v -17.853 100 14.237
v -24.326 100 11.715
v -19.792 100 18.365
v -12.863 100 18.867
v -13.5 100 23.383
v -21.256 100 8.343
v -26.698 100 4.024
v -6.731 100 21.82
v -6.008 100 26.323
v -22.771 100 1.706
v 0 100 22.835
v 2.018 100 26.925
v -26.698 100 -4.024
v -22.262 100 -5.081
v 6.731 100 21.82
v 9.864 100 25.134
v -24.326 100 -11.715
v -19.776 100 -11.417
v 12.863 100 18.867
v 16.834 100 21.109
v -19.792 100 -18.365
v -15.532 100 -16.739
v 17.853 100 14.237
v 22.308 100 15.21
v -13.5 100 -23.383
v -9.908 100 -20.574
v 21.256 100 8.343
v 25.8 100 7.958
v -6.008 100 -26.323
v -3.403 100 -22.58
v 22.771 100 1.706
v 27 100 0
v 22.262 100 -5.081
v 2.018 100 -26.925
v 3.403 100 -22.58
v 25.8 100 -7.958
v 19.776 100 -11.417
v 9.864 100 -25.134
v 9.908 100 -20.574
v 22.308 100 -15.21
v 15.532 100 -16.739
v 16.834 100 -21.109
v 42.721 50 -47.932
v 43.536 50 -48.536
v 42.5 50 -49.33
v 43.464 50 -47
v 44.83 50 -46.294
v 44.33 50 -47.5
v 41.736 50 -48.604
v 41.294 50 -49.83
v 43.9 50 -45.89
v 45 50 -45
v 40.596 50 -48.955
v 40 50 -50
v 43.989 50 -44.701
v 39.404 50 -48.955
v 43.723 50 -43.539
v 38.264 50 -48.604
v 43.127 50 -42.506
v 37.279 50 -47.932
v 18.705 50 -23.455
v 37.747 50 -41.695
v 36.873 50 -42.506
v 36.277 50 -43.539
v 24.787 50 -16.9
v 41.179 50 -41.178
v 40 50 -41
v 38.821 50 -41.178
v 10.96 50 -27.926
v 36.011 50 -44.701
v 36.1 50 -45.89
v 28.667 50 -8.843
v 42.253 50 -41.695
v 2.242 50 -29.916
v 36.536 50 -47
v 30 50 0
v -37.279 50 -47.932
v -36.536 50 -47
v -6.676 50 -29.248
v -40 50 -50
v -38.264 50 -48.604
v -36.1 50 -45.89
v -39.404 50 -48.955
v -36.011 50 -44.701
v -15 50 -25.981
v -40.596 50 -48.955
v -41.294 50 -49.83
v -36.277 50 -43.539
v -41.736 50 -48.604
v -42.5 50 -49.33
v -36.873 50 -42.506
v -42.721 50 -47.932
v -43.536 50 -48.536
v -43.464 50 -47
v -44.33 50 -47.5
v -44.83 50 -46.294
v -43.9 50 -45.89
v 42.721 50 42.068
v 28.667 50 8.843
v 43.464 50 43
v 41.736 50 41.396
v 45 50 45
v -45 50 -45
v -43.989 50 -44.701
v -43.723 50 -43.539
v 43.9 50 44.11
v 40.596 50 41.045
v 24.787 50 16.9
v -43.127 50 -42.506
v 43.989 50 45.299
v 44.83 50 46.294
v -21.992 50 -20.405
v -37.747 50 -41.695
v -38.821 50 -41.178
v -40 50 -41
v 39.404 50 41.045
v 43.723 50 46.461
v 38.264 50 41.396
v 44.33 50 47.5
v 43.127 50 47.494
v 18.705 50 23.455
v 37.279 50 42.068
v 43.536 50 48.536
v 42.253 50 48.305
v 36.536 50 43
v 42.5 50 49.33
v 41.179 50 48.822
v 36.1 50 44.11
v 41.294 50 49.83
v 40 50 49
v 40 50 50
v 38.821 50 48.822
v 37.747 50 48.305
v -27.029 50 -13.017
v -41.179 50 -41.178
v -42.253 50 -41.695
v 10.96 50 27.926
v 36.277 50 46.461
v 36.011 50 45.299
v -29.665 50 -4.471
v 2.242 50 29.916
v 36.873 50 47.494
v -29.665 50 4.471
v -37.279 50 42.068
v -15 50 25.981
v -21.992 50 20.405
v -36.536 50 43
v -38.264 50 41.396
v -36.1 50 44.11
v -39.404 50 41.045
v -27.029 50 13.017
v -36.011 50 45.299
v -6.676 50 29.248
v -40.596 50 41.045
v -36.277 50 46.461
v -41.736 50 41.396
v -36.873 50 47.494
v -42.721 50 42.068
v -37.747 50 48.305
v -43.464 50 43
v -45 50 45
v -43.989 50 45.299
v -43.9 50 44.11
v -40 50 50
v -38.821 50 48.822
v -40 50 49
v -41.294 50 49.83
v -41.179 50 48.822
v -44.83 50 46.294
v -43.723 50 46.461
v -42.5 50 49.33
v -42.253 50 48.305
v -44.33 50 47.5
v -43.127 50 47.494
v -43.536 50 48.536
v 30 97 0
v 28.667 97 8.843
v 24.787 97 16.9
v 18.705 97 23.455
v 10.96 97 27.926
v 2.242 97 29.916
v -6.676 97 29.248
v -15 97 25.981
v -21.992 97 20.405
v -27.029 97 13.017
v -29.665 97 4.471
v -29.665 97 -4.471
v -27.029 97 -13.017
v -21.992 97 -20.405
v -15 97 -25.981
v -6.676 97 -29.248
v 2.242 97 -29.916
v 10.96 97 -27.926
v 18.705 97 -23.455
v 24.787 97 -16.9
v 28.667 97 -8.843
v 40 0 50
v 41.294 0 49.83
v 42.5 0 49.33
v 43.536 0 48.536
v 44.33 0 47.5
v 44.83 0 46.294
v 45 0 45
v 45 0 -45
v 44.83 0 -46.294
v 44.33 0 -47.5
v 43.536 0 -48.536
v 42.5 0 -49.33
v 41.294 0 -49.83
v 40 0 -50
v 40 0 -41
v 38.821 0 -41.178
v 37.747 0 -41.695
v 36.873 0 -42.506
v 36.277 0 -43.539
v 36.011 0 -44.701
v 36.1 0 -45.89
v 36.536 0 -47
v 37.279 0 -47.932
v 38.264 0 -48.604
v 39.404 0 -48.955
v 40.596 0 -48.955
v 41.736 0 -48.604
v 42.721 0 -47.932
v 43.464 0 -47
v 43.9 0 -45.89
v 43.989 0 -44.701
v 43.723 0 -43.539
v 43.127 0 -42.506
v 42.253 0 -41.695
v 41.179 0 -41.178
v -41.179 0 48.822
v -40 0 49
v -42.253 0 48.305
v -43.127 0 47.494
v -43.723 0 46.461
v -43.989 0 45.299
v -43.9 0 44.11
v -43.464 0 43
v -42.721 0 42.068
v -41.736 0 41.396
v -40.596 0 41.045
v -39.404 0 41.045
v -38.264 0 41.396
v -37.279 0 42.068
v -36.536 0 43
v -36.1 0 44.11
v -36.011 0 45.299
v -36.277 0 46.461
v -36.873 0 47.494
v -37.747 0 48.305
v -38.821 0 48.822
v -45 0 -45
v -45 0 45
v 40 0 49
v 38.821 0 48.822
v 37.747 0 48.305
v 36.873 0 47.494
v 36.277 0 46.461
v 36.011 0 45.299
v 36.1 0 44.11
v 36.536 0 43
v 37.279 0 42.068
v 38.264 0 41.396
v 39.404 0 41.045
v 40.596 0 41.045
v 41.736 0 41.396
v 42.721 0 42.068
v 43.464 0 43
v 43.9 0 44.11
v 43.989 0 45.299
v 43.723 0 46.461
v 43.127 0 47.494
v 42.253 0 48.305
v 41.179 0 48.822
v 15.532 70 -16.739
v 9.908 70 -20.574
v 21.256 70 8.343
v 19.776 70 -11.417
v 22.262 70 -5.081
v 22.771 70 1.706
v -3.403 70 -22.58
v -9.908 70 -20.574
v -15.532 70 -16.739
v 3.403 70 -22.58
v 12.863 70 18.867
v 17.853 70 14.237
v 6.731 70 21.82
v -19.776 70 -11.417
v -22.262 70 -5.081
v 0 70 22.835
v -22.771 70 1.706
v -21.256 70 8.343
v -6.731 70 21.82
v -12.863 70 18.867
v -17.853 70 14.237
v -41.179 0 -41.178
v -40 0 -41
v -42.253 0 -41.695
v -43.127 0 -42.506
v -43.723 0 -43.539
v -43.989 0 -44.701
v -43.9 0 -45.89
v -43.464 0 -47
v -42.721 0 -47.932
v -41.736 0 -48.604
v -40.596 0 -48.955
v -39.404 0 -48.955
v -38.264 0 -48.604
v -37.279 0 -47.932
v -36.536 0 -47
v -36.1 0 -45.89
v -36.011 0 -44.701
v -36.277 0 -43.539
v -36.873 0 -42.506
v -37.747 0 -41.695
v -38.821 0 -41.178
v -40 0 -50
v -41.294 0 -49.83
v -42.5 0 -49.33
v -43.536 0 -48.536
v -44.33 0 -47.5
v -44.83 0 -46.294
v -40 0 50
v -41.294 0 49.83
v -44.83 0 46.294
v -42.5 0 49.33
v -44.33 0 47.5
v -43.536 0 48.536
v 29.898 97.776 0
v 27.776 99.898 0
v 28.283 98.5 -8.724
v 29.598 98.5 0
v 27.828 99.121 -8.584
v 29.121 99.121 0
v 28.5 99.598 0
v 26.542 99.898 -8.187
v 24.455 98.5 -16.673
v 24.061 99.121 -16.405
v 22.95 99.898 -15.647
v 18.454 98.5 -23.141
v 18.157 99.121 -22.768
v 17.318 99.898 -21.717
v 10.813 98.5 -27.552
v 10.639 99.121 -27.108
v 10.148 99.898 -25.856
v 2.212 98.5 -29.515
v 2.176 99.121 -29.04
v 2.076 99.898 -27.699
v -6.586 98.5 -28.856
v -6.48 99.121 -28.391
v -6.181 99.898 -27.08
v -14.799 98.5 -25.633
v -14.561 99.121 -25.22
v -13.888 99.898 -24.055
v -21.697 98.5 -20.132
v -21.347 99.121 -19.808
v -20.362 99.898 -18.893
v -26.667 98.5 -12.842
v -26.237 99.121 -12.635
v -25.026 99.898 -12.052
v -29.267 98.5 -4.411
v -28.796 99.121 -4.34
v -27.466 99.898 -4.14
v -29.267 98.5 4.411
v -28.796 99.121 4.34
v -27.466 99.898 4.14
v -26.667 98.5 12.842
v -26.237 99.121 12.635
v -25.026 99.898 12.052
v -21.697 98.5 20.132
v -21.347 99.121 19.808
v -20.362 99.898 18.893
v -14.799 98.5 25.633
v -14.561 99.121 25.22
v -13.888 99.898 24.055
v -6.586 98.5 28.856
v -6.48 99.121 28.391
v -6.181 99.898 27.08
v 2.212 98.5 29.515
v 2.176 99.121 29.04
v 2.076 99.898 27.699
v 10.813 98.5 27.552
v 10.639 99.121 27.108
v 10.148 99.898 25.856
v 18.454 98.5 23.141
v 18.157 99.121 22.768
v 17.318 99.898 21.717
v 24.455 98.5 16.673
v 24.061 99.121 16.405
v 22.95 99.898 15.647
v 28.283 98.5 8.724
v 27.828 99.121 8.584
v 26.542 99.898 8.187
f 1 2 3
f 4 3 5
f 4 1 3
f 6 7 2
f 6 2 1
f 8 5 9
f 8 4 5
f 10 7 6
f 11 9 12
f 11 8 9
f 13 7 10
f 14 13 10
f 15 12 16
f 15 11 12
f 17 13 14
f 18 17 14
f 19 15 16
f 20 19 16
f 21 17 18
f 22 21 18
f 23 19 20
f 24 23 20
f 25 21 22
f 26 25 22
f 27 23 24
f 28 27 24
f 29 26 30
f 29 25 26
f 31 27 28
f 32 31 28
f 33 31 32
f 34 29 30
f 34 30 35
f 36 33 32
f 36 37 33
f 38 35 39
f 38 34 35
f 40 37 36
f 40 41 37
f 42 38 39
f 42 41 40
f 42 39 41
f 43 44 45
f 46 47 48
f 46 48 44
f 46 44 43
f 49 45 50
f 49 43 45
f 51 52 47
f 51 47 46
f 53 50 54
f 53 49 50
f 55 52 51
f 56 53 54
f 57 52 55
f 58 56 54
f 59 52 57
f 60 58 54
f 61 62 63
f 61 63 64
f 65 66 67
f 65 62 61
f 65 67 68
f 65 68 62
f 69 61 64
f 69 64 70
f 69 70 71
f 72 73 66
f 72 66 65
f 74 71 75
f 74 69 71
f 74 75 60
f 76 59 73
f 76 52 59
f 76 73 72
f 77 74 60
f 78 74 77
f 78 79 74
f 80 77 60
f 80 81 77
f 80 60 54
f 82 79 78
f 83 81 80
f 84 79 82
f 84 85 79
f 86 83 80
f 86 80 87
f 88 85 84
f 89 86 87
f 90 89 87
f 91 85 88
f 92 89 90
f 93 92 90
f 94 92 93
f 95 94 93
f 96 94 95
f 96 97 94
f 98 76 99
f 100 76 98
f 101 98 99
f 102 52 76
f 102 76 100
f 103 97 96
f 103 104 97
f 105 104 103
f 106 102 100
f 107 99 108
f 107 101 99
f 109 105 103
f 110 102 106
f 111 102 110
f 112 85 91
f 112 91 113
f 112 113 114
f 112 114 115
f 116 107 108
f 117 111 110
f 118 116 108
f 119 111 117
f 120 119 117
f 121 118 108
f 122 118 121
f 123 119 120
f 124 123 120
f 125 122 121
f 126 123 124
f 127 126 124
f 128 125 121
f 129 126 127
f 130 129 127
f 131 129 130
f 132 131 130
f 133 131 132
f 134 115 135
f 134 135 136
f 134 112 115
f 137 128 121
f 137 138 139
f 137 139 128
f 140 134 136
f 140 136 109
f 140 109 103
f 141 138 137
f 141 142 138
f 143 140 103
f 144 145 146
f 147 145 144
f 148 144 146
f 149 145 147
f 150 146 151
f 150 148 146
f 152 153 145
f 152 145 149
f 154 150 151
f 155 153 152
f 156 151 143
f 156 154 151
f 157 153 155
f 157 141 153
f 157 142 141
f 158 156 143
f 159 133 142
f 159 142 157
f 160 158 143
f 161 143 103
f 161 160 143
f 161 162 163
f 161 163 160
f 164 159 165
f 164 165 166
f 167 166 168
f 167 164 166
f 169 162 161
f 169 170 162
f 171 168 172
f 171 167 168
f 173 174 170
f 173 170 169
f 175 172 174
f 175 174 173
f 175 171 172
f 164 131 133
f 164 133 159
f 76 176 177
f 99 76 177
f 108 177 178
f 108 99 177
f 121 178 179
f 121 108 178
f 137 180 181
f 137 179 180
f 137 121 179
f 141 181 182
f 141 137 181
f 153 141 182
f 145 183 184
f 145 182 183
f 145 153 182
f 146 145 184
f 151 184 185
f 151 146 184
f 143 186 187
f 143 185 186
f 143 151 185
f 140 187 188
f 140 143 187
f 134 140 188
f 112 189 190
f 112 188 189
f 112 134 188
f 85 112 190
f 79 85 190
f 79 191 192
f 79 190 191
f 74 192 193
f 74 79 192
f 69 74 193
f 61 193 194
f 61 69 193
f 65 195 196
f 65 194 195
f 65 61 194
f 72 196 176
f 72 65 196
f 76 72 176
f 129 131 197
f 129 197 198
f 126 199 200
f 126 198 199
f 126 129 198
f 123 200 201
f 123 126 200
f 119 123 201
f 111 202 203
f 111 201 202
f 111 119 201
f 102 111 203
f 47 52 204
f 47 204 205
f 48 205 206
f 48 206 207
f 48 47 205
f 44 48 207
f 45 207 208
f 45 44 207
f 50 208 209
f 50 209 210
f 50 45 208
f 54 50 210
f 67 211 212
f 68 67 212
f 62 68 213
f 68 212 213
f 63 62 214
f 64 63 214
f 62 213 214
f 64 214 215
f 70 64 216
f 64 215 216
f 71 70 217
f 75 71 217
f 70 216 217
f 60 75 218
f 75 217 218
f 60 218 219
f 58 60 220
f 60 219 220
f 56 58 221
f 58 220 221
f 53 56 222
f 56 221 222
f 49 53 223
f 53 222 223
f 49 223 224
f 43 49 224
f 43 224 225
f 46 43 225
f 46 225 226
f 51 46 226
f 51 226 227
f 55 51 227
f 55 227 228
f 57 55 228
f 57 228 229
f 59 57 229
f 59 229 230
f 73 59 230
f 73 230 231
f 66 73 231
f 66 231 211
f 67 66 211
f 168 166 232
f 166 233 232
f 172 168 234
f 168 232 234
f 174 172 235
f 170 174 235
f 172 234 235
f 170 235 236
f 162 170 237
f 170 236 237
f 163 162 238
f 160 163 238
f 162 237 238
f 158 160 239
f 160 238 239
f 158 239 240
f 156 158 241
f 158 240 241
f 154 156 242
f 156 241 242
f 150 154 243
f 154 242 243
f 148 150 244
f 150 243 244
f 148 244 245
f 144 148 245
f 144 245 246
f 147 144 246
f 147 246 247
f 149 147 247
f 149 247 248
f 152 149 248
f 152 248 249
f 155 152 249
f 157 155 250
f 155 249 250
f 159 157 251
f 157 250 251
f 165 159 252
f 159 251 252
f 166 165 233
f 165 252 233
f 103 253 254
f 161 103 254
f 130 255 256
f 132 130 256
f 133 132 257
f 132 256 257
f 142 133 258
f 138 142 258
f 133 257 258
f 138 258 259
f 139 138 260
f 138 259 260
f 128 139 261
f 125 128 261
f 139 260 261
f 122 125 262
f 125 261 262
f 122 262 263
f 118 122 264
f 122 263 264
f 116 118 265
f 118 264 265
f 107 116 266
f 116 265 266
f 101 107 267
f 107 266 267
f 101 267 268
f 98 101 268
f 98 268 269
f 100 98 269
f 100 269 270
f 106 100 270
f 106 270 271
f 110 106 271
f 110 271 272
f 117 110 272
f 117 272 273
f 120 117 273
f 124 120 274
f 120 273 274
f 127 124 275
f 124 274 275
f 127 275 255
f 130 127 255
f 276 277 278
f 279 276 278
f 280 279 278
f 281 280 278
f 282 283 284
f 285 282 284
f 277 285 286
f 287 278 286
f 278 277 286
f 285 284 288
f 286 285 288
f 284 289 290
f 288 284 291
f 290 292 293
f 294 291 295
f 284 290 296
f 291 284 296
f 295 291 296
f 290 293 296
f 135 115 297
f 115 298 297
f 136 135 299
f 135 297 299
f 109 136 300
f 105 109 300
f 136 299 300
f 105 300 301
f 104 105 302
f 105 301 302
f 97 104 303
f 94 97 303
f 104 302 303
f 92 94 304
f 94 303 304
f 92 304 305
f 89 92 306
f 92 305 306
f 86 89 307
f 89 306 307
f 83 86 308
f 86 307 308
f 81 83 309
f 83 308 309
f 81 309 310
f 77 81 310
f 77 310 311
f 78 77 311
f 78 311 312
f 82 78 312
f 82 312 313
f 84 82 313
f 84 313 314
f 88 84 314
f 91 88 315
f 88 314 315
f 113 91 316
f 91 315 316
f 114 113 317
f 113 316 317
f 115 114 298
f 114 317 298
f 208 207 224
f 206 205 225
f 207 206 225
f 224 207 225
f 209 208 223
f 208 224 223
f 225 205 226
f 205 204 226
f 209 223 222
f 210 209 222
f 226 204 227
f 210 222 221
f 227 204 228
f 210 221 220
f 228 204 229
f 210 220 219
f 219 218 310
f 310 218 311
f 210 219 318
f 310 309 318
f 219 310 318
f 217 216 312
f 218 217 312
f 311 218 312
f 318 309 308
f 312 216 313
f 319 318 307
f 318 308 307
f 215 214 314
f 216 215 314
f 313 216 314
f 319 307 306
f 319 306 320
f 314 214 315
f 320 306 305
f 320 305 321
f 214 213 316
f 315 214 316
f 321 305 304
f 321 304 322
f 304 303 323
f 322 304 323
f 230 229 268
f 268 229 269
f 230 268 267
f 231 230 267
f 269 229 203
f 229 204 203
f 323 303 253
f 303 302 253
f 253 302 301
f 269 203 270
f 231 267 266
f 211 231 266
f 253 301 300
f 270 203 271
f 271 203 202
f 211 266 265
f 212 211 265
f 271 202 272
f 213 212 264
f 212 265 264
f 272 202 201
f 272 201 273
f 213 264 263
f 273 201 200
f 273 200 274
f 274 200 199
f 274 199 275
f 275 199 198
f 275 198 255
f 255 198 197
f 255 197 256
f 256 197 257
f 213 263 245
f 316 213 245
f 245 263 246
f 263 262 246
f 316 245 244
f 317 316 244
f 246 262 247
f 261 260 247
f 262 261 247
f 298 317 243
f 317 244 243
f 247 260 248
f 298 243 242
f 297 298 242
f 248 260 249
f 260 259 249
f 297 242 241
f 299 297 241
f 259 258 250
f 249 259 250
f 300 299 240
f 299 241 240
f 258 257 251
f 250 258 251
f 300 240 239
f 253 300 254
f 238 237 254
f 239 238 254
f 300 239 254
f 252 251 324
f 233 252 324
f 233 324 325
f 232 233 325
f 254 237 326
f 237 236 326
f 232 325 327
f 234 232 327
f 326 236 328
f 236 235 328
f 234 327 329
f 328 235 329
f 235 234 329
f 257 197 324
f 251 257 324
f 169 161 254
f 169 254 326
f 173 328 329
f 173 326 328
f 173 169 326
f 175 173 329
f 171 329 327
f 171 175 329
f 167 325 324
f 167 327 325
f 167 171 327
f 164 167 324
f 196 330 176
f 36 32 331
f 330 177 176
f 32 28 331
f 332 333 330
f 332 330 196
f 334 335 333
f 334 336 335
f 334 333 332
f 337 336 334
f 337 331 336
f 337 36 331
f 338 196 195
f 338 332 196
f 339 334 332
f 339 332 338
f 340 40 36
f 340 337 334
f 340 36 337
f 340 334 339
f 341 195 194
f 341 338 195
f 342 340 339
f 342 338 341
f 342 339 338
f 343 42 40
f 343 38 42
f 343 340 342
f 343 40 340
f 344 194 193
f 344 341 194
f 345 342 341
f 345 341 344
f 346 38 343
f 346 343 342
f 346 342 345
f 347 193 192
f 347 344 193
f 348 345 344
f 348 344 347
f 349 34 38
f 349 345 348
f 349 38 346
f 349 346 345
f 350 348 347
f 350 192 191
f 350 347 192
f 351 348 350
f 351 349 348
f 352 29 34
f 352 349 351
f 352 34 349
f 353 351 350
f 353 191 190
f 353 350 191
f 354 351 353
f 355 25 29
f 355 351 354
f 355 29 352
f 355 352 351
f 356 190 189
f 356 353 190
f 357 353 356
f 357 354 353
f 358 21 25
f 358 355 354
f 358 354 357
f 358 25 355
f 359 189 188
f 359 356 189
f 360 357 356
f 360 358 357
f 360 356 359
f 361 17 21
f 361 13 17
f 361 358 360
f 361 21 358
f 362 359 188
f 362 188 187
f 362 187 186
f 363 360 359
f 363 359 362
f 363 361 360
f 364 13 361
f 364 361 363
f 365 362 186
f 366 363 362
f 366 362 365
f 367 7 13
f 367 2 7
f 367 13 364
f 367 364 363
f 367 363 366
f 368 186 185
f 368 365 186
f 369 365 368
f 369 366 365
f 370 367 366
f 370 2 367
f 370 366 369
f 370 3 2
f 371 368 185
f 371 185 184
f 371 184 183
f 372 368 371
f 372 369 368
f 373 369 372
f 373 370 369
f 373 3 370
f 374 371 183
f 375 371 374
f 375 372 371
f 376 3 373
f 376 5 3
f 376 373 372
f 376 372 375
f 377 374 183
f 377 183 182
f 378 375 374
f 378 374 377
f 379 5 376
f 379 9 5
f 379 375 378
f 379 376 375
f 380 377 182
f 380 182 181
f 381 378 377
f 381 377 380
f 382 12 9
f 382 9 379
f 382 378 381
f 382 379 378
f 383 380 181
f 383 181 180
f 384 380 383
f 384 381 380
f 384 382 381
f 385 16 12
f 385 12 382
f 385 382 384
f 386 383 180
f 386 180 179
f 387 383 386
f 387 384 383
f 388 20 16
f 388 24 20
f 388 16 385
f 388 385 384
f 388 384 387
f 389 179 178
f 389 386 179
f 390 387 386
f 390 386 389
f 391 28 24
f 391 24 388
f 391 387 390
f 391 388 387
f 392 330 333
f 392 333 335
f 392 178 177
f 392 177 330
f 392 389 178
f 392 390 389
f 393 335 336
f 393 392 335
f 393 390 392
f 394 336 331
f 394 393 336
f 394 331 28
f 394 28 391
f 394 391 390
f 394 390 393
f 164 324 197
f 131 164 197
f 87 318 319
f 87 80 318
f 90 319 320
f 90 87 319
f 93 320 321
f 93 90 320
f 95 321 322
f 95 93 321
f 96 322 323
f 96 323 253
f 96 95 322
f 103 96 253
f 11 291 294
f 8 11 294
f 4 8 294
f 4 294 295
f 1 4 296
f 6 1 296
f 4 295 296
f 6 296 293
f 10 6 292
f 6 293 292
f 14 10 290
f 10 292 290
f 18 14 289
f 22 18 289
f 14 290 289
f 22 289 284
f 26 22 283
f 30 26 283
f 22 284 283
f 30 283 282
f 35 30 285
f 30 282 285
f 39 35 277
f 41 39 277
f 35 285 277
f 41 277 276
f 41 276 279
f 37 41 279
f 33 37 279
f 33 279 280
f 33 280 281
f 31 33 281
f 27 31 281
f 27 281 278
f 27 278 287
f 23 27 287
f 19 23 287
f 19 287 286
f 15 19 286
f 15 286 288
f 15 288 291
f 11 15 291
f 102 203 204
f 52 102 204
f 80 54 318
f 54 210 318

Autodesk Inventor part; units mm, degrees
ref_plane "YZ Plane" through (0, 0, 0) normal (1, 0, 0) x (0, 1, 0)
ref_plane "XZ Plane" through (0, 0, 0) normal (0, 1, 0) x (-1, 0, 0)
ref_plane "XY Plane" through (0, 0, 0) normal (0, 0, 1) x (1, 0, 0)
sketch "Boceto1" plane through (0, 0, 0) normal (0, 1, 0) x (-1, 0, 0)
  point P0 (0, 0)
sketch "Boceto2" plane through (0, 0, 0) normal (0, 1, 0) x (-1, 0, 0)
  line L0 (-45, -50) -> (45, -50)
  line L1 (45, -50) -> (45, 50)
  line L2 (45, 50) -> (-45, 50)
  line L3 (-45, 50) -> (-45, -50)
  line L4 (-45, -50) -> (45, 50) construction
  line L5 (45, -50) -> (-45, 50) construction
  point P0 (0, 0)
  dimension "d0" = 90
  dimension "d1" = 100
extrude "Extrusión1" add sketch "Boceto2" along normal blind 50
sketch "Boceto3" plane through (0, 50, 0) normal (0, 1, 0) x (1, 0, 0)
  point P0 (0, 0)
  point P1 (0, 0)
sketch "Boceto4" plane through (0, 50, 0) normal (0, 1, 0) x (1, 0, 0)
  circle A0 centre (0, 0) radius 30
  dimension "d4" = 60
extrude "Extrusión2" add sketch "Boceto4" along normal blind 50
sketch "Boceto5" plane through (0, 100, 0) normal (0, 1, 0) x (1, 0, 0)
  point P0 (0, 0)
  point P1 (0, 0)
fillet "Empalme1" radius 3 1 edges at (-30, 100, 0)
hole "Agujero1" at (0, 100, 0) direction (0, -1, 0) diameter 45.6699 depth 30 thread size "M50x4" class "6H" standard "ANSI Metric M Profile"
fillet "Empalme2" radius 5 1 edges at (45, 25, 50)
fillet "Empalme3" radius 5 1 edges at (-45, 25, 50)
fillet "Empalme4" radius 5 1 edges at (45, 25, -50)
fillet "Empalme5" radius 5 1 edges at (-45, 25, -50)
sketch "Boceto9" plane through (0, 50, 0) normal (0, 1, 0) x (1, 0, 0)
  arc A0 (-40, 50) -> (-45, 45) centre (-40, 45) ccw projected
  circle A1 centre (-40, 45) radius 4
  arc A2 (45, 45) -> (40, 50) centre (40, 45) ccw projected
  circle A3 centre (40, 45) radius 4
  arc A4 (-45, -45) -> (-40, -50) centre (-40, -45) ccw projected
  circle A5 centre (-40, -45) radius 4
  arc A6 (40, -50) -> (45, -45) centre (40, -45) ccw projected
  circle A7 centre (40, -45) radius 4
  point P0 (0, 0)
  dimension "d28" = 8
  dimension "d29" = 8
  dimension "d30" = 8
  dimension "d31" = 8
hole "Agujero2" at (-40, 50, 45) at (-40, 50, -45) at (40, 50, -45) at (40, 50, 45) direction (0, -1, 0) diameter 8 depth 50
properties part number "Practica No. 1 Oscar Bustamante"
